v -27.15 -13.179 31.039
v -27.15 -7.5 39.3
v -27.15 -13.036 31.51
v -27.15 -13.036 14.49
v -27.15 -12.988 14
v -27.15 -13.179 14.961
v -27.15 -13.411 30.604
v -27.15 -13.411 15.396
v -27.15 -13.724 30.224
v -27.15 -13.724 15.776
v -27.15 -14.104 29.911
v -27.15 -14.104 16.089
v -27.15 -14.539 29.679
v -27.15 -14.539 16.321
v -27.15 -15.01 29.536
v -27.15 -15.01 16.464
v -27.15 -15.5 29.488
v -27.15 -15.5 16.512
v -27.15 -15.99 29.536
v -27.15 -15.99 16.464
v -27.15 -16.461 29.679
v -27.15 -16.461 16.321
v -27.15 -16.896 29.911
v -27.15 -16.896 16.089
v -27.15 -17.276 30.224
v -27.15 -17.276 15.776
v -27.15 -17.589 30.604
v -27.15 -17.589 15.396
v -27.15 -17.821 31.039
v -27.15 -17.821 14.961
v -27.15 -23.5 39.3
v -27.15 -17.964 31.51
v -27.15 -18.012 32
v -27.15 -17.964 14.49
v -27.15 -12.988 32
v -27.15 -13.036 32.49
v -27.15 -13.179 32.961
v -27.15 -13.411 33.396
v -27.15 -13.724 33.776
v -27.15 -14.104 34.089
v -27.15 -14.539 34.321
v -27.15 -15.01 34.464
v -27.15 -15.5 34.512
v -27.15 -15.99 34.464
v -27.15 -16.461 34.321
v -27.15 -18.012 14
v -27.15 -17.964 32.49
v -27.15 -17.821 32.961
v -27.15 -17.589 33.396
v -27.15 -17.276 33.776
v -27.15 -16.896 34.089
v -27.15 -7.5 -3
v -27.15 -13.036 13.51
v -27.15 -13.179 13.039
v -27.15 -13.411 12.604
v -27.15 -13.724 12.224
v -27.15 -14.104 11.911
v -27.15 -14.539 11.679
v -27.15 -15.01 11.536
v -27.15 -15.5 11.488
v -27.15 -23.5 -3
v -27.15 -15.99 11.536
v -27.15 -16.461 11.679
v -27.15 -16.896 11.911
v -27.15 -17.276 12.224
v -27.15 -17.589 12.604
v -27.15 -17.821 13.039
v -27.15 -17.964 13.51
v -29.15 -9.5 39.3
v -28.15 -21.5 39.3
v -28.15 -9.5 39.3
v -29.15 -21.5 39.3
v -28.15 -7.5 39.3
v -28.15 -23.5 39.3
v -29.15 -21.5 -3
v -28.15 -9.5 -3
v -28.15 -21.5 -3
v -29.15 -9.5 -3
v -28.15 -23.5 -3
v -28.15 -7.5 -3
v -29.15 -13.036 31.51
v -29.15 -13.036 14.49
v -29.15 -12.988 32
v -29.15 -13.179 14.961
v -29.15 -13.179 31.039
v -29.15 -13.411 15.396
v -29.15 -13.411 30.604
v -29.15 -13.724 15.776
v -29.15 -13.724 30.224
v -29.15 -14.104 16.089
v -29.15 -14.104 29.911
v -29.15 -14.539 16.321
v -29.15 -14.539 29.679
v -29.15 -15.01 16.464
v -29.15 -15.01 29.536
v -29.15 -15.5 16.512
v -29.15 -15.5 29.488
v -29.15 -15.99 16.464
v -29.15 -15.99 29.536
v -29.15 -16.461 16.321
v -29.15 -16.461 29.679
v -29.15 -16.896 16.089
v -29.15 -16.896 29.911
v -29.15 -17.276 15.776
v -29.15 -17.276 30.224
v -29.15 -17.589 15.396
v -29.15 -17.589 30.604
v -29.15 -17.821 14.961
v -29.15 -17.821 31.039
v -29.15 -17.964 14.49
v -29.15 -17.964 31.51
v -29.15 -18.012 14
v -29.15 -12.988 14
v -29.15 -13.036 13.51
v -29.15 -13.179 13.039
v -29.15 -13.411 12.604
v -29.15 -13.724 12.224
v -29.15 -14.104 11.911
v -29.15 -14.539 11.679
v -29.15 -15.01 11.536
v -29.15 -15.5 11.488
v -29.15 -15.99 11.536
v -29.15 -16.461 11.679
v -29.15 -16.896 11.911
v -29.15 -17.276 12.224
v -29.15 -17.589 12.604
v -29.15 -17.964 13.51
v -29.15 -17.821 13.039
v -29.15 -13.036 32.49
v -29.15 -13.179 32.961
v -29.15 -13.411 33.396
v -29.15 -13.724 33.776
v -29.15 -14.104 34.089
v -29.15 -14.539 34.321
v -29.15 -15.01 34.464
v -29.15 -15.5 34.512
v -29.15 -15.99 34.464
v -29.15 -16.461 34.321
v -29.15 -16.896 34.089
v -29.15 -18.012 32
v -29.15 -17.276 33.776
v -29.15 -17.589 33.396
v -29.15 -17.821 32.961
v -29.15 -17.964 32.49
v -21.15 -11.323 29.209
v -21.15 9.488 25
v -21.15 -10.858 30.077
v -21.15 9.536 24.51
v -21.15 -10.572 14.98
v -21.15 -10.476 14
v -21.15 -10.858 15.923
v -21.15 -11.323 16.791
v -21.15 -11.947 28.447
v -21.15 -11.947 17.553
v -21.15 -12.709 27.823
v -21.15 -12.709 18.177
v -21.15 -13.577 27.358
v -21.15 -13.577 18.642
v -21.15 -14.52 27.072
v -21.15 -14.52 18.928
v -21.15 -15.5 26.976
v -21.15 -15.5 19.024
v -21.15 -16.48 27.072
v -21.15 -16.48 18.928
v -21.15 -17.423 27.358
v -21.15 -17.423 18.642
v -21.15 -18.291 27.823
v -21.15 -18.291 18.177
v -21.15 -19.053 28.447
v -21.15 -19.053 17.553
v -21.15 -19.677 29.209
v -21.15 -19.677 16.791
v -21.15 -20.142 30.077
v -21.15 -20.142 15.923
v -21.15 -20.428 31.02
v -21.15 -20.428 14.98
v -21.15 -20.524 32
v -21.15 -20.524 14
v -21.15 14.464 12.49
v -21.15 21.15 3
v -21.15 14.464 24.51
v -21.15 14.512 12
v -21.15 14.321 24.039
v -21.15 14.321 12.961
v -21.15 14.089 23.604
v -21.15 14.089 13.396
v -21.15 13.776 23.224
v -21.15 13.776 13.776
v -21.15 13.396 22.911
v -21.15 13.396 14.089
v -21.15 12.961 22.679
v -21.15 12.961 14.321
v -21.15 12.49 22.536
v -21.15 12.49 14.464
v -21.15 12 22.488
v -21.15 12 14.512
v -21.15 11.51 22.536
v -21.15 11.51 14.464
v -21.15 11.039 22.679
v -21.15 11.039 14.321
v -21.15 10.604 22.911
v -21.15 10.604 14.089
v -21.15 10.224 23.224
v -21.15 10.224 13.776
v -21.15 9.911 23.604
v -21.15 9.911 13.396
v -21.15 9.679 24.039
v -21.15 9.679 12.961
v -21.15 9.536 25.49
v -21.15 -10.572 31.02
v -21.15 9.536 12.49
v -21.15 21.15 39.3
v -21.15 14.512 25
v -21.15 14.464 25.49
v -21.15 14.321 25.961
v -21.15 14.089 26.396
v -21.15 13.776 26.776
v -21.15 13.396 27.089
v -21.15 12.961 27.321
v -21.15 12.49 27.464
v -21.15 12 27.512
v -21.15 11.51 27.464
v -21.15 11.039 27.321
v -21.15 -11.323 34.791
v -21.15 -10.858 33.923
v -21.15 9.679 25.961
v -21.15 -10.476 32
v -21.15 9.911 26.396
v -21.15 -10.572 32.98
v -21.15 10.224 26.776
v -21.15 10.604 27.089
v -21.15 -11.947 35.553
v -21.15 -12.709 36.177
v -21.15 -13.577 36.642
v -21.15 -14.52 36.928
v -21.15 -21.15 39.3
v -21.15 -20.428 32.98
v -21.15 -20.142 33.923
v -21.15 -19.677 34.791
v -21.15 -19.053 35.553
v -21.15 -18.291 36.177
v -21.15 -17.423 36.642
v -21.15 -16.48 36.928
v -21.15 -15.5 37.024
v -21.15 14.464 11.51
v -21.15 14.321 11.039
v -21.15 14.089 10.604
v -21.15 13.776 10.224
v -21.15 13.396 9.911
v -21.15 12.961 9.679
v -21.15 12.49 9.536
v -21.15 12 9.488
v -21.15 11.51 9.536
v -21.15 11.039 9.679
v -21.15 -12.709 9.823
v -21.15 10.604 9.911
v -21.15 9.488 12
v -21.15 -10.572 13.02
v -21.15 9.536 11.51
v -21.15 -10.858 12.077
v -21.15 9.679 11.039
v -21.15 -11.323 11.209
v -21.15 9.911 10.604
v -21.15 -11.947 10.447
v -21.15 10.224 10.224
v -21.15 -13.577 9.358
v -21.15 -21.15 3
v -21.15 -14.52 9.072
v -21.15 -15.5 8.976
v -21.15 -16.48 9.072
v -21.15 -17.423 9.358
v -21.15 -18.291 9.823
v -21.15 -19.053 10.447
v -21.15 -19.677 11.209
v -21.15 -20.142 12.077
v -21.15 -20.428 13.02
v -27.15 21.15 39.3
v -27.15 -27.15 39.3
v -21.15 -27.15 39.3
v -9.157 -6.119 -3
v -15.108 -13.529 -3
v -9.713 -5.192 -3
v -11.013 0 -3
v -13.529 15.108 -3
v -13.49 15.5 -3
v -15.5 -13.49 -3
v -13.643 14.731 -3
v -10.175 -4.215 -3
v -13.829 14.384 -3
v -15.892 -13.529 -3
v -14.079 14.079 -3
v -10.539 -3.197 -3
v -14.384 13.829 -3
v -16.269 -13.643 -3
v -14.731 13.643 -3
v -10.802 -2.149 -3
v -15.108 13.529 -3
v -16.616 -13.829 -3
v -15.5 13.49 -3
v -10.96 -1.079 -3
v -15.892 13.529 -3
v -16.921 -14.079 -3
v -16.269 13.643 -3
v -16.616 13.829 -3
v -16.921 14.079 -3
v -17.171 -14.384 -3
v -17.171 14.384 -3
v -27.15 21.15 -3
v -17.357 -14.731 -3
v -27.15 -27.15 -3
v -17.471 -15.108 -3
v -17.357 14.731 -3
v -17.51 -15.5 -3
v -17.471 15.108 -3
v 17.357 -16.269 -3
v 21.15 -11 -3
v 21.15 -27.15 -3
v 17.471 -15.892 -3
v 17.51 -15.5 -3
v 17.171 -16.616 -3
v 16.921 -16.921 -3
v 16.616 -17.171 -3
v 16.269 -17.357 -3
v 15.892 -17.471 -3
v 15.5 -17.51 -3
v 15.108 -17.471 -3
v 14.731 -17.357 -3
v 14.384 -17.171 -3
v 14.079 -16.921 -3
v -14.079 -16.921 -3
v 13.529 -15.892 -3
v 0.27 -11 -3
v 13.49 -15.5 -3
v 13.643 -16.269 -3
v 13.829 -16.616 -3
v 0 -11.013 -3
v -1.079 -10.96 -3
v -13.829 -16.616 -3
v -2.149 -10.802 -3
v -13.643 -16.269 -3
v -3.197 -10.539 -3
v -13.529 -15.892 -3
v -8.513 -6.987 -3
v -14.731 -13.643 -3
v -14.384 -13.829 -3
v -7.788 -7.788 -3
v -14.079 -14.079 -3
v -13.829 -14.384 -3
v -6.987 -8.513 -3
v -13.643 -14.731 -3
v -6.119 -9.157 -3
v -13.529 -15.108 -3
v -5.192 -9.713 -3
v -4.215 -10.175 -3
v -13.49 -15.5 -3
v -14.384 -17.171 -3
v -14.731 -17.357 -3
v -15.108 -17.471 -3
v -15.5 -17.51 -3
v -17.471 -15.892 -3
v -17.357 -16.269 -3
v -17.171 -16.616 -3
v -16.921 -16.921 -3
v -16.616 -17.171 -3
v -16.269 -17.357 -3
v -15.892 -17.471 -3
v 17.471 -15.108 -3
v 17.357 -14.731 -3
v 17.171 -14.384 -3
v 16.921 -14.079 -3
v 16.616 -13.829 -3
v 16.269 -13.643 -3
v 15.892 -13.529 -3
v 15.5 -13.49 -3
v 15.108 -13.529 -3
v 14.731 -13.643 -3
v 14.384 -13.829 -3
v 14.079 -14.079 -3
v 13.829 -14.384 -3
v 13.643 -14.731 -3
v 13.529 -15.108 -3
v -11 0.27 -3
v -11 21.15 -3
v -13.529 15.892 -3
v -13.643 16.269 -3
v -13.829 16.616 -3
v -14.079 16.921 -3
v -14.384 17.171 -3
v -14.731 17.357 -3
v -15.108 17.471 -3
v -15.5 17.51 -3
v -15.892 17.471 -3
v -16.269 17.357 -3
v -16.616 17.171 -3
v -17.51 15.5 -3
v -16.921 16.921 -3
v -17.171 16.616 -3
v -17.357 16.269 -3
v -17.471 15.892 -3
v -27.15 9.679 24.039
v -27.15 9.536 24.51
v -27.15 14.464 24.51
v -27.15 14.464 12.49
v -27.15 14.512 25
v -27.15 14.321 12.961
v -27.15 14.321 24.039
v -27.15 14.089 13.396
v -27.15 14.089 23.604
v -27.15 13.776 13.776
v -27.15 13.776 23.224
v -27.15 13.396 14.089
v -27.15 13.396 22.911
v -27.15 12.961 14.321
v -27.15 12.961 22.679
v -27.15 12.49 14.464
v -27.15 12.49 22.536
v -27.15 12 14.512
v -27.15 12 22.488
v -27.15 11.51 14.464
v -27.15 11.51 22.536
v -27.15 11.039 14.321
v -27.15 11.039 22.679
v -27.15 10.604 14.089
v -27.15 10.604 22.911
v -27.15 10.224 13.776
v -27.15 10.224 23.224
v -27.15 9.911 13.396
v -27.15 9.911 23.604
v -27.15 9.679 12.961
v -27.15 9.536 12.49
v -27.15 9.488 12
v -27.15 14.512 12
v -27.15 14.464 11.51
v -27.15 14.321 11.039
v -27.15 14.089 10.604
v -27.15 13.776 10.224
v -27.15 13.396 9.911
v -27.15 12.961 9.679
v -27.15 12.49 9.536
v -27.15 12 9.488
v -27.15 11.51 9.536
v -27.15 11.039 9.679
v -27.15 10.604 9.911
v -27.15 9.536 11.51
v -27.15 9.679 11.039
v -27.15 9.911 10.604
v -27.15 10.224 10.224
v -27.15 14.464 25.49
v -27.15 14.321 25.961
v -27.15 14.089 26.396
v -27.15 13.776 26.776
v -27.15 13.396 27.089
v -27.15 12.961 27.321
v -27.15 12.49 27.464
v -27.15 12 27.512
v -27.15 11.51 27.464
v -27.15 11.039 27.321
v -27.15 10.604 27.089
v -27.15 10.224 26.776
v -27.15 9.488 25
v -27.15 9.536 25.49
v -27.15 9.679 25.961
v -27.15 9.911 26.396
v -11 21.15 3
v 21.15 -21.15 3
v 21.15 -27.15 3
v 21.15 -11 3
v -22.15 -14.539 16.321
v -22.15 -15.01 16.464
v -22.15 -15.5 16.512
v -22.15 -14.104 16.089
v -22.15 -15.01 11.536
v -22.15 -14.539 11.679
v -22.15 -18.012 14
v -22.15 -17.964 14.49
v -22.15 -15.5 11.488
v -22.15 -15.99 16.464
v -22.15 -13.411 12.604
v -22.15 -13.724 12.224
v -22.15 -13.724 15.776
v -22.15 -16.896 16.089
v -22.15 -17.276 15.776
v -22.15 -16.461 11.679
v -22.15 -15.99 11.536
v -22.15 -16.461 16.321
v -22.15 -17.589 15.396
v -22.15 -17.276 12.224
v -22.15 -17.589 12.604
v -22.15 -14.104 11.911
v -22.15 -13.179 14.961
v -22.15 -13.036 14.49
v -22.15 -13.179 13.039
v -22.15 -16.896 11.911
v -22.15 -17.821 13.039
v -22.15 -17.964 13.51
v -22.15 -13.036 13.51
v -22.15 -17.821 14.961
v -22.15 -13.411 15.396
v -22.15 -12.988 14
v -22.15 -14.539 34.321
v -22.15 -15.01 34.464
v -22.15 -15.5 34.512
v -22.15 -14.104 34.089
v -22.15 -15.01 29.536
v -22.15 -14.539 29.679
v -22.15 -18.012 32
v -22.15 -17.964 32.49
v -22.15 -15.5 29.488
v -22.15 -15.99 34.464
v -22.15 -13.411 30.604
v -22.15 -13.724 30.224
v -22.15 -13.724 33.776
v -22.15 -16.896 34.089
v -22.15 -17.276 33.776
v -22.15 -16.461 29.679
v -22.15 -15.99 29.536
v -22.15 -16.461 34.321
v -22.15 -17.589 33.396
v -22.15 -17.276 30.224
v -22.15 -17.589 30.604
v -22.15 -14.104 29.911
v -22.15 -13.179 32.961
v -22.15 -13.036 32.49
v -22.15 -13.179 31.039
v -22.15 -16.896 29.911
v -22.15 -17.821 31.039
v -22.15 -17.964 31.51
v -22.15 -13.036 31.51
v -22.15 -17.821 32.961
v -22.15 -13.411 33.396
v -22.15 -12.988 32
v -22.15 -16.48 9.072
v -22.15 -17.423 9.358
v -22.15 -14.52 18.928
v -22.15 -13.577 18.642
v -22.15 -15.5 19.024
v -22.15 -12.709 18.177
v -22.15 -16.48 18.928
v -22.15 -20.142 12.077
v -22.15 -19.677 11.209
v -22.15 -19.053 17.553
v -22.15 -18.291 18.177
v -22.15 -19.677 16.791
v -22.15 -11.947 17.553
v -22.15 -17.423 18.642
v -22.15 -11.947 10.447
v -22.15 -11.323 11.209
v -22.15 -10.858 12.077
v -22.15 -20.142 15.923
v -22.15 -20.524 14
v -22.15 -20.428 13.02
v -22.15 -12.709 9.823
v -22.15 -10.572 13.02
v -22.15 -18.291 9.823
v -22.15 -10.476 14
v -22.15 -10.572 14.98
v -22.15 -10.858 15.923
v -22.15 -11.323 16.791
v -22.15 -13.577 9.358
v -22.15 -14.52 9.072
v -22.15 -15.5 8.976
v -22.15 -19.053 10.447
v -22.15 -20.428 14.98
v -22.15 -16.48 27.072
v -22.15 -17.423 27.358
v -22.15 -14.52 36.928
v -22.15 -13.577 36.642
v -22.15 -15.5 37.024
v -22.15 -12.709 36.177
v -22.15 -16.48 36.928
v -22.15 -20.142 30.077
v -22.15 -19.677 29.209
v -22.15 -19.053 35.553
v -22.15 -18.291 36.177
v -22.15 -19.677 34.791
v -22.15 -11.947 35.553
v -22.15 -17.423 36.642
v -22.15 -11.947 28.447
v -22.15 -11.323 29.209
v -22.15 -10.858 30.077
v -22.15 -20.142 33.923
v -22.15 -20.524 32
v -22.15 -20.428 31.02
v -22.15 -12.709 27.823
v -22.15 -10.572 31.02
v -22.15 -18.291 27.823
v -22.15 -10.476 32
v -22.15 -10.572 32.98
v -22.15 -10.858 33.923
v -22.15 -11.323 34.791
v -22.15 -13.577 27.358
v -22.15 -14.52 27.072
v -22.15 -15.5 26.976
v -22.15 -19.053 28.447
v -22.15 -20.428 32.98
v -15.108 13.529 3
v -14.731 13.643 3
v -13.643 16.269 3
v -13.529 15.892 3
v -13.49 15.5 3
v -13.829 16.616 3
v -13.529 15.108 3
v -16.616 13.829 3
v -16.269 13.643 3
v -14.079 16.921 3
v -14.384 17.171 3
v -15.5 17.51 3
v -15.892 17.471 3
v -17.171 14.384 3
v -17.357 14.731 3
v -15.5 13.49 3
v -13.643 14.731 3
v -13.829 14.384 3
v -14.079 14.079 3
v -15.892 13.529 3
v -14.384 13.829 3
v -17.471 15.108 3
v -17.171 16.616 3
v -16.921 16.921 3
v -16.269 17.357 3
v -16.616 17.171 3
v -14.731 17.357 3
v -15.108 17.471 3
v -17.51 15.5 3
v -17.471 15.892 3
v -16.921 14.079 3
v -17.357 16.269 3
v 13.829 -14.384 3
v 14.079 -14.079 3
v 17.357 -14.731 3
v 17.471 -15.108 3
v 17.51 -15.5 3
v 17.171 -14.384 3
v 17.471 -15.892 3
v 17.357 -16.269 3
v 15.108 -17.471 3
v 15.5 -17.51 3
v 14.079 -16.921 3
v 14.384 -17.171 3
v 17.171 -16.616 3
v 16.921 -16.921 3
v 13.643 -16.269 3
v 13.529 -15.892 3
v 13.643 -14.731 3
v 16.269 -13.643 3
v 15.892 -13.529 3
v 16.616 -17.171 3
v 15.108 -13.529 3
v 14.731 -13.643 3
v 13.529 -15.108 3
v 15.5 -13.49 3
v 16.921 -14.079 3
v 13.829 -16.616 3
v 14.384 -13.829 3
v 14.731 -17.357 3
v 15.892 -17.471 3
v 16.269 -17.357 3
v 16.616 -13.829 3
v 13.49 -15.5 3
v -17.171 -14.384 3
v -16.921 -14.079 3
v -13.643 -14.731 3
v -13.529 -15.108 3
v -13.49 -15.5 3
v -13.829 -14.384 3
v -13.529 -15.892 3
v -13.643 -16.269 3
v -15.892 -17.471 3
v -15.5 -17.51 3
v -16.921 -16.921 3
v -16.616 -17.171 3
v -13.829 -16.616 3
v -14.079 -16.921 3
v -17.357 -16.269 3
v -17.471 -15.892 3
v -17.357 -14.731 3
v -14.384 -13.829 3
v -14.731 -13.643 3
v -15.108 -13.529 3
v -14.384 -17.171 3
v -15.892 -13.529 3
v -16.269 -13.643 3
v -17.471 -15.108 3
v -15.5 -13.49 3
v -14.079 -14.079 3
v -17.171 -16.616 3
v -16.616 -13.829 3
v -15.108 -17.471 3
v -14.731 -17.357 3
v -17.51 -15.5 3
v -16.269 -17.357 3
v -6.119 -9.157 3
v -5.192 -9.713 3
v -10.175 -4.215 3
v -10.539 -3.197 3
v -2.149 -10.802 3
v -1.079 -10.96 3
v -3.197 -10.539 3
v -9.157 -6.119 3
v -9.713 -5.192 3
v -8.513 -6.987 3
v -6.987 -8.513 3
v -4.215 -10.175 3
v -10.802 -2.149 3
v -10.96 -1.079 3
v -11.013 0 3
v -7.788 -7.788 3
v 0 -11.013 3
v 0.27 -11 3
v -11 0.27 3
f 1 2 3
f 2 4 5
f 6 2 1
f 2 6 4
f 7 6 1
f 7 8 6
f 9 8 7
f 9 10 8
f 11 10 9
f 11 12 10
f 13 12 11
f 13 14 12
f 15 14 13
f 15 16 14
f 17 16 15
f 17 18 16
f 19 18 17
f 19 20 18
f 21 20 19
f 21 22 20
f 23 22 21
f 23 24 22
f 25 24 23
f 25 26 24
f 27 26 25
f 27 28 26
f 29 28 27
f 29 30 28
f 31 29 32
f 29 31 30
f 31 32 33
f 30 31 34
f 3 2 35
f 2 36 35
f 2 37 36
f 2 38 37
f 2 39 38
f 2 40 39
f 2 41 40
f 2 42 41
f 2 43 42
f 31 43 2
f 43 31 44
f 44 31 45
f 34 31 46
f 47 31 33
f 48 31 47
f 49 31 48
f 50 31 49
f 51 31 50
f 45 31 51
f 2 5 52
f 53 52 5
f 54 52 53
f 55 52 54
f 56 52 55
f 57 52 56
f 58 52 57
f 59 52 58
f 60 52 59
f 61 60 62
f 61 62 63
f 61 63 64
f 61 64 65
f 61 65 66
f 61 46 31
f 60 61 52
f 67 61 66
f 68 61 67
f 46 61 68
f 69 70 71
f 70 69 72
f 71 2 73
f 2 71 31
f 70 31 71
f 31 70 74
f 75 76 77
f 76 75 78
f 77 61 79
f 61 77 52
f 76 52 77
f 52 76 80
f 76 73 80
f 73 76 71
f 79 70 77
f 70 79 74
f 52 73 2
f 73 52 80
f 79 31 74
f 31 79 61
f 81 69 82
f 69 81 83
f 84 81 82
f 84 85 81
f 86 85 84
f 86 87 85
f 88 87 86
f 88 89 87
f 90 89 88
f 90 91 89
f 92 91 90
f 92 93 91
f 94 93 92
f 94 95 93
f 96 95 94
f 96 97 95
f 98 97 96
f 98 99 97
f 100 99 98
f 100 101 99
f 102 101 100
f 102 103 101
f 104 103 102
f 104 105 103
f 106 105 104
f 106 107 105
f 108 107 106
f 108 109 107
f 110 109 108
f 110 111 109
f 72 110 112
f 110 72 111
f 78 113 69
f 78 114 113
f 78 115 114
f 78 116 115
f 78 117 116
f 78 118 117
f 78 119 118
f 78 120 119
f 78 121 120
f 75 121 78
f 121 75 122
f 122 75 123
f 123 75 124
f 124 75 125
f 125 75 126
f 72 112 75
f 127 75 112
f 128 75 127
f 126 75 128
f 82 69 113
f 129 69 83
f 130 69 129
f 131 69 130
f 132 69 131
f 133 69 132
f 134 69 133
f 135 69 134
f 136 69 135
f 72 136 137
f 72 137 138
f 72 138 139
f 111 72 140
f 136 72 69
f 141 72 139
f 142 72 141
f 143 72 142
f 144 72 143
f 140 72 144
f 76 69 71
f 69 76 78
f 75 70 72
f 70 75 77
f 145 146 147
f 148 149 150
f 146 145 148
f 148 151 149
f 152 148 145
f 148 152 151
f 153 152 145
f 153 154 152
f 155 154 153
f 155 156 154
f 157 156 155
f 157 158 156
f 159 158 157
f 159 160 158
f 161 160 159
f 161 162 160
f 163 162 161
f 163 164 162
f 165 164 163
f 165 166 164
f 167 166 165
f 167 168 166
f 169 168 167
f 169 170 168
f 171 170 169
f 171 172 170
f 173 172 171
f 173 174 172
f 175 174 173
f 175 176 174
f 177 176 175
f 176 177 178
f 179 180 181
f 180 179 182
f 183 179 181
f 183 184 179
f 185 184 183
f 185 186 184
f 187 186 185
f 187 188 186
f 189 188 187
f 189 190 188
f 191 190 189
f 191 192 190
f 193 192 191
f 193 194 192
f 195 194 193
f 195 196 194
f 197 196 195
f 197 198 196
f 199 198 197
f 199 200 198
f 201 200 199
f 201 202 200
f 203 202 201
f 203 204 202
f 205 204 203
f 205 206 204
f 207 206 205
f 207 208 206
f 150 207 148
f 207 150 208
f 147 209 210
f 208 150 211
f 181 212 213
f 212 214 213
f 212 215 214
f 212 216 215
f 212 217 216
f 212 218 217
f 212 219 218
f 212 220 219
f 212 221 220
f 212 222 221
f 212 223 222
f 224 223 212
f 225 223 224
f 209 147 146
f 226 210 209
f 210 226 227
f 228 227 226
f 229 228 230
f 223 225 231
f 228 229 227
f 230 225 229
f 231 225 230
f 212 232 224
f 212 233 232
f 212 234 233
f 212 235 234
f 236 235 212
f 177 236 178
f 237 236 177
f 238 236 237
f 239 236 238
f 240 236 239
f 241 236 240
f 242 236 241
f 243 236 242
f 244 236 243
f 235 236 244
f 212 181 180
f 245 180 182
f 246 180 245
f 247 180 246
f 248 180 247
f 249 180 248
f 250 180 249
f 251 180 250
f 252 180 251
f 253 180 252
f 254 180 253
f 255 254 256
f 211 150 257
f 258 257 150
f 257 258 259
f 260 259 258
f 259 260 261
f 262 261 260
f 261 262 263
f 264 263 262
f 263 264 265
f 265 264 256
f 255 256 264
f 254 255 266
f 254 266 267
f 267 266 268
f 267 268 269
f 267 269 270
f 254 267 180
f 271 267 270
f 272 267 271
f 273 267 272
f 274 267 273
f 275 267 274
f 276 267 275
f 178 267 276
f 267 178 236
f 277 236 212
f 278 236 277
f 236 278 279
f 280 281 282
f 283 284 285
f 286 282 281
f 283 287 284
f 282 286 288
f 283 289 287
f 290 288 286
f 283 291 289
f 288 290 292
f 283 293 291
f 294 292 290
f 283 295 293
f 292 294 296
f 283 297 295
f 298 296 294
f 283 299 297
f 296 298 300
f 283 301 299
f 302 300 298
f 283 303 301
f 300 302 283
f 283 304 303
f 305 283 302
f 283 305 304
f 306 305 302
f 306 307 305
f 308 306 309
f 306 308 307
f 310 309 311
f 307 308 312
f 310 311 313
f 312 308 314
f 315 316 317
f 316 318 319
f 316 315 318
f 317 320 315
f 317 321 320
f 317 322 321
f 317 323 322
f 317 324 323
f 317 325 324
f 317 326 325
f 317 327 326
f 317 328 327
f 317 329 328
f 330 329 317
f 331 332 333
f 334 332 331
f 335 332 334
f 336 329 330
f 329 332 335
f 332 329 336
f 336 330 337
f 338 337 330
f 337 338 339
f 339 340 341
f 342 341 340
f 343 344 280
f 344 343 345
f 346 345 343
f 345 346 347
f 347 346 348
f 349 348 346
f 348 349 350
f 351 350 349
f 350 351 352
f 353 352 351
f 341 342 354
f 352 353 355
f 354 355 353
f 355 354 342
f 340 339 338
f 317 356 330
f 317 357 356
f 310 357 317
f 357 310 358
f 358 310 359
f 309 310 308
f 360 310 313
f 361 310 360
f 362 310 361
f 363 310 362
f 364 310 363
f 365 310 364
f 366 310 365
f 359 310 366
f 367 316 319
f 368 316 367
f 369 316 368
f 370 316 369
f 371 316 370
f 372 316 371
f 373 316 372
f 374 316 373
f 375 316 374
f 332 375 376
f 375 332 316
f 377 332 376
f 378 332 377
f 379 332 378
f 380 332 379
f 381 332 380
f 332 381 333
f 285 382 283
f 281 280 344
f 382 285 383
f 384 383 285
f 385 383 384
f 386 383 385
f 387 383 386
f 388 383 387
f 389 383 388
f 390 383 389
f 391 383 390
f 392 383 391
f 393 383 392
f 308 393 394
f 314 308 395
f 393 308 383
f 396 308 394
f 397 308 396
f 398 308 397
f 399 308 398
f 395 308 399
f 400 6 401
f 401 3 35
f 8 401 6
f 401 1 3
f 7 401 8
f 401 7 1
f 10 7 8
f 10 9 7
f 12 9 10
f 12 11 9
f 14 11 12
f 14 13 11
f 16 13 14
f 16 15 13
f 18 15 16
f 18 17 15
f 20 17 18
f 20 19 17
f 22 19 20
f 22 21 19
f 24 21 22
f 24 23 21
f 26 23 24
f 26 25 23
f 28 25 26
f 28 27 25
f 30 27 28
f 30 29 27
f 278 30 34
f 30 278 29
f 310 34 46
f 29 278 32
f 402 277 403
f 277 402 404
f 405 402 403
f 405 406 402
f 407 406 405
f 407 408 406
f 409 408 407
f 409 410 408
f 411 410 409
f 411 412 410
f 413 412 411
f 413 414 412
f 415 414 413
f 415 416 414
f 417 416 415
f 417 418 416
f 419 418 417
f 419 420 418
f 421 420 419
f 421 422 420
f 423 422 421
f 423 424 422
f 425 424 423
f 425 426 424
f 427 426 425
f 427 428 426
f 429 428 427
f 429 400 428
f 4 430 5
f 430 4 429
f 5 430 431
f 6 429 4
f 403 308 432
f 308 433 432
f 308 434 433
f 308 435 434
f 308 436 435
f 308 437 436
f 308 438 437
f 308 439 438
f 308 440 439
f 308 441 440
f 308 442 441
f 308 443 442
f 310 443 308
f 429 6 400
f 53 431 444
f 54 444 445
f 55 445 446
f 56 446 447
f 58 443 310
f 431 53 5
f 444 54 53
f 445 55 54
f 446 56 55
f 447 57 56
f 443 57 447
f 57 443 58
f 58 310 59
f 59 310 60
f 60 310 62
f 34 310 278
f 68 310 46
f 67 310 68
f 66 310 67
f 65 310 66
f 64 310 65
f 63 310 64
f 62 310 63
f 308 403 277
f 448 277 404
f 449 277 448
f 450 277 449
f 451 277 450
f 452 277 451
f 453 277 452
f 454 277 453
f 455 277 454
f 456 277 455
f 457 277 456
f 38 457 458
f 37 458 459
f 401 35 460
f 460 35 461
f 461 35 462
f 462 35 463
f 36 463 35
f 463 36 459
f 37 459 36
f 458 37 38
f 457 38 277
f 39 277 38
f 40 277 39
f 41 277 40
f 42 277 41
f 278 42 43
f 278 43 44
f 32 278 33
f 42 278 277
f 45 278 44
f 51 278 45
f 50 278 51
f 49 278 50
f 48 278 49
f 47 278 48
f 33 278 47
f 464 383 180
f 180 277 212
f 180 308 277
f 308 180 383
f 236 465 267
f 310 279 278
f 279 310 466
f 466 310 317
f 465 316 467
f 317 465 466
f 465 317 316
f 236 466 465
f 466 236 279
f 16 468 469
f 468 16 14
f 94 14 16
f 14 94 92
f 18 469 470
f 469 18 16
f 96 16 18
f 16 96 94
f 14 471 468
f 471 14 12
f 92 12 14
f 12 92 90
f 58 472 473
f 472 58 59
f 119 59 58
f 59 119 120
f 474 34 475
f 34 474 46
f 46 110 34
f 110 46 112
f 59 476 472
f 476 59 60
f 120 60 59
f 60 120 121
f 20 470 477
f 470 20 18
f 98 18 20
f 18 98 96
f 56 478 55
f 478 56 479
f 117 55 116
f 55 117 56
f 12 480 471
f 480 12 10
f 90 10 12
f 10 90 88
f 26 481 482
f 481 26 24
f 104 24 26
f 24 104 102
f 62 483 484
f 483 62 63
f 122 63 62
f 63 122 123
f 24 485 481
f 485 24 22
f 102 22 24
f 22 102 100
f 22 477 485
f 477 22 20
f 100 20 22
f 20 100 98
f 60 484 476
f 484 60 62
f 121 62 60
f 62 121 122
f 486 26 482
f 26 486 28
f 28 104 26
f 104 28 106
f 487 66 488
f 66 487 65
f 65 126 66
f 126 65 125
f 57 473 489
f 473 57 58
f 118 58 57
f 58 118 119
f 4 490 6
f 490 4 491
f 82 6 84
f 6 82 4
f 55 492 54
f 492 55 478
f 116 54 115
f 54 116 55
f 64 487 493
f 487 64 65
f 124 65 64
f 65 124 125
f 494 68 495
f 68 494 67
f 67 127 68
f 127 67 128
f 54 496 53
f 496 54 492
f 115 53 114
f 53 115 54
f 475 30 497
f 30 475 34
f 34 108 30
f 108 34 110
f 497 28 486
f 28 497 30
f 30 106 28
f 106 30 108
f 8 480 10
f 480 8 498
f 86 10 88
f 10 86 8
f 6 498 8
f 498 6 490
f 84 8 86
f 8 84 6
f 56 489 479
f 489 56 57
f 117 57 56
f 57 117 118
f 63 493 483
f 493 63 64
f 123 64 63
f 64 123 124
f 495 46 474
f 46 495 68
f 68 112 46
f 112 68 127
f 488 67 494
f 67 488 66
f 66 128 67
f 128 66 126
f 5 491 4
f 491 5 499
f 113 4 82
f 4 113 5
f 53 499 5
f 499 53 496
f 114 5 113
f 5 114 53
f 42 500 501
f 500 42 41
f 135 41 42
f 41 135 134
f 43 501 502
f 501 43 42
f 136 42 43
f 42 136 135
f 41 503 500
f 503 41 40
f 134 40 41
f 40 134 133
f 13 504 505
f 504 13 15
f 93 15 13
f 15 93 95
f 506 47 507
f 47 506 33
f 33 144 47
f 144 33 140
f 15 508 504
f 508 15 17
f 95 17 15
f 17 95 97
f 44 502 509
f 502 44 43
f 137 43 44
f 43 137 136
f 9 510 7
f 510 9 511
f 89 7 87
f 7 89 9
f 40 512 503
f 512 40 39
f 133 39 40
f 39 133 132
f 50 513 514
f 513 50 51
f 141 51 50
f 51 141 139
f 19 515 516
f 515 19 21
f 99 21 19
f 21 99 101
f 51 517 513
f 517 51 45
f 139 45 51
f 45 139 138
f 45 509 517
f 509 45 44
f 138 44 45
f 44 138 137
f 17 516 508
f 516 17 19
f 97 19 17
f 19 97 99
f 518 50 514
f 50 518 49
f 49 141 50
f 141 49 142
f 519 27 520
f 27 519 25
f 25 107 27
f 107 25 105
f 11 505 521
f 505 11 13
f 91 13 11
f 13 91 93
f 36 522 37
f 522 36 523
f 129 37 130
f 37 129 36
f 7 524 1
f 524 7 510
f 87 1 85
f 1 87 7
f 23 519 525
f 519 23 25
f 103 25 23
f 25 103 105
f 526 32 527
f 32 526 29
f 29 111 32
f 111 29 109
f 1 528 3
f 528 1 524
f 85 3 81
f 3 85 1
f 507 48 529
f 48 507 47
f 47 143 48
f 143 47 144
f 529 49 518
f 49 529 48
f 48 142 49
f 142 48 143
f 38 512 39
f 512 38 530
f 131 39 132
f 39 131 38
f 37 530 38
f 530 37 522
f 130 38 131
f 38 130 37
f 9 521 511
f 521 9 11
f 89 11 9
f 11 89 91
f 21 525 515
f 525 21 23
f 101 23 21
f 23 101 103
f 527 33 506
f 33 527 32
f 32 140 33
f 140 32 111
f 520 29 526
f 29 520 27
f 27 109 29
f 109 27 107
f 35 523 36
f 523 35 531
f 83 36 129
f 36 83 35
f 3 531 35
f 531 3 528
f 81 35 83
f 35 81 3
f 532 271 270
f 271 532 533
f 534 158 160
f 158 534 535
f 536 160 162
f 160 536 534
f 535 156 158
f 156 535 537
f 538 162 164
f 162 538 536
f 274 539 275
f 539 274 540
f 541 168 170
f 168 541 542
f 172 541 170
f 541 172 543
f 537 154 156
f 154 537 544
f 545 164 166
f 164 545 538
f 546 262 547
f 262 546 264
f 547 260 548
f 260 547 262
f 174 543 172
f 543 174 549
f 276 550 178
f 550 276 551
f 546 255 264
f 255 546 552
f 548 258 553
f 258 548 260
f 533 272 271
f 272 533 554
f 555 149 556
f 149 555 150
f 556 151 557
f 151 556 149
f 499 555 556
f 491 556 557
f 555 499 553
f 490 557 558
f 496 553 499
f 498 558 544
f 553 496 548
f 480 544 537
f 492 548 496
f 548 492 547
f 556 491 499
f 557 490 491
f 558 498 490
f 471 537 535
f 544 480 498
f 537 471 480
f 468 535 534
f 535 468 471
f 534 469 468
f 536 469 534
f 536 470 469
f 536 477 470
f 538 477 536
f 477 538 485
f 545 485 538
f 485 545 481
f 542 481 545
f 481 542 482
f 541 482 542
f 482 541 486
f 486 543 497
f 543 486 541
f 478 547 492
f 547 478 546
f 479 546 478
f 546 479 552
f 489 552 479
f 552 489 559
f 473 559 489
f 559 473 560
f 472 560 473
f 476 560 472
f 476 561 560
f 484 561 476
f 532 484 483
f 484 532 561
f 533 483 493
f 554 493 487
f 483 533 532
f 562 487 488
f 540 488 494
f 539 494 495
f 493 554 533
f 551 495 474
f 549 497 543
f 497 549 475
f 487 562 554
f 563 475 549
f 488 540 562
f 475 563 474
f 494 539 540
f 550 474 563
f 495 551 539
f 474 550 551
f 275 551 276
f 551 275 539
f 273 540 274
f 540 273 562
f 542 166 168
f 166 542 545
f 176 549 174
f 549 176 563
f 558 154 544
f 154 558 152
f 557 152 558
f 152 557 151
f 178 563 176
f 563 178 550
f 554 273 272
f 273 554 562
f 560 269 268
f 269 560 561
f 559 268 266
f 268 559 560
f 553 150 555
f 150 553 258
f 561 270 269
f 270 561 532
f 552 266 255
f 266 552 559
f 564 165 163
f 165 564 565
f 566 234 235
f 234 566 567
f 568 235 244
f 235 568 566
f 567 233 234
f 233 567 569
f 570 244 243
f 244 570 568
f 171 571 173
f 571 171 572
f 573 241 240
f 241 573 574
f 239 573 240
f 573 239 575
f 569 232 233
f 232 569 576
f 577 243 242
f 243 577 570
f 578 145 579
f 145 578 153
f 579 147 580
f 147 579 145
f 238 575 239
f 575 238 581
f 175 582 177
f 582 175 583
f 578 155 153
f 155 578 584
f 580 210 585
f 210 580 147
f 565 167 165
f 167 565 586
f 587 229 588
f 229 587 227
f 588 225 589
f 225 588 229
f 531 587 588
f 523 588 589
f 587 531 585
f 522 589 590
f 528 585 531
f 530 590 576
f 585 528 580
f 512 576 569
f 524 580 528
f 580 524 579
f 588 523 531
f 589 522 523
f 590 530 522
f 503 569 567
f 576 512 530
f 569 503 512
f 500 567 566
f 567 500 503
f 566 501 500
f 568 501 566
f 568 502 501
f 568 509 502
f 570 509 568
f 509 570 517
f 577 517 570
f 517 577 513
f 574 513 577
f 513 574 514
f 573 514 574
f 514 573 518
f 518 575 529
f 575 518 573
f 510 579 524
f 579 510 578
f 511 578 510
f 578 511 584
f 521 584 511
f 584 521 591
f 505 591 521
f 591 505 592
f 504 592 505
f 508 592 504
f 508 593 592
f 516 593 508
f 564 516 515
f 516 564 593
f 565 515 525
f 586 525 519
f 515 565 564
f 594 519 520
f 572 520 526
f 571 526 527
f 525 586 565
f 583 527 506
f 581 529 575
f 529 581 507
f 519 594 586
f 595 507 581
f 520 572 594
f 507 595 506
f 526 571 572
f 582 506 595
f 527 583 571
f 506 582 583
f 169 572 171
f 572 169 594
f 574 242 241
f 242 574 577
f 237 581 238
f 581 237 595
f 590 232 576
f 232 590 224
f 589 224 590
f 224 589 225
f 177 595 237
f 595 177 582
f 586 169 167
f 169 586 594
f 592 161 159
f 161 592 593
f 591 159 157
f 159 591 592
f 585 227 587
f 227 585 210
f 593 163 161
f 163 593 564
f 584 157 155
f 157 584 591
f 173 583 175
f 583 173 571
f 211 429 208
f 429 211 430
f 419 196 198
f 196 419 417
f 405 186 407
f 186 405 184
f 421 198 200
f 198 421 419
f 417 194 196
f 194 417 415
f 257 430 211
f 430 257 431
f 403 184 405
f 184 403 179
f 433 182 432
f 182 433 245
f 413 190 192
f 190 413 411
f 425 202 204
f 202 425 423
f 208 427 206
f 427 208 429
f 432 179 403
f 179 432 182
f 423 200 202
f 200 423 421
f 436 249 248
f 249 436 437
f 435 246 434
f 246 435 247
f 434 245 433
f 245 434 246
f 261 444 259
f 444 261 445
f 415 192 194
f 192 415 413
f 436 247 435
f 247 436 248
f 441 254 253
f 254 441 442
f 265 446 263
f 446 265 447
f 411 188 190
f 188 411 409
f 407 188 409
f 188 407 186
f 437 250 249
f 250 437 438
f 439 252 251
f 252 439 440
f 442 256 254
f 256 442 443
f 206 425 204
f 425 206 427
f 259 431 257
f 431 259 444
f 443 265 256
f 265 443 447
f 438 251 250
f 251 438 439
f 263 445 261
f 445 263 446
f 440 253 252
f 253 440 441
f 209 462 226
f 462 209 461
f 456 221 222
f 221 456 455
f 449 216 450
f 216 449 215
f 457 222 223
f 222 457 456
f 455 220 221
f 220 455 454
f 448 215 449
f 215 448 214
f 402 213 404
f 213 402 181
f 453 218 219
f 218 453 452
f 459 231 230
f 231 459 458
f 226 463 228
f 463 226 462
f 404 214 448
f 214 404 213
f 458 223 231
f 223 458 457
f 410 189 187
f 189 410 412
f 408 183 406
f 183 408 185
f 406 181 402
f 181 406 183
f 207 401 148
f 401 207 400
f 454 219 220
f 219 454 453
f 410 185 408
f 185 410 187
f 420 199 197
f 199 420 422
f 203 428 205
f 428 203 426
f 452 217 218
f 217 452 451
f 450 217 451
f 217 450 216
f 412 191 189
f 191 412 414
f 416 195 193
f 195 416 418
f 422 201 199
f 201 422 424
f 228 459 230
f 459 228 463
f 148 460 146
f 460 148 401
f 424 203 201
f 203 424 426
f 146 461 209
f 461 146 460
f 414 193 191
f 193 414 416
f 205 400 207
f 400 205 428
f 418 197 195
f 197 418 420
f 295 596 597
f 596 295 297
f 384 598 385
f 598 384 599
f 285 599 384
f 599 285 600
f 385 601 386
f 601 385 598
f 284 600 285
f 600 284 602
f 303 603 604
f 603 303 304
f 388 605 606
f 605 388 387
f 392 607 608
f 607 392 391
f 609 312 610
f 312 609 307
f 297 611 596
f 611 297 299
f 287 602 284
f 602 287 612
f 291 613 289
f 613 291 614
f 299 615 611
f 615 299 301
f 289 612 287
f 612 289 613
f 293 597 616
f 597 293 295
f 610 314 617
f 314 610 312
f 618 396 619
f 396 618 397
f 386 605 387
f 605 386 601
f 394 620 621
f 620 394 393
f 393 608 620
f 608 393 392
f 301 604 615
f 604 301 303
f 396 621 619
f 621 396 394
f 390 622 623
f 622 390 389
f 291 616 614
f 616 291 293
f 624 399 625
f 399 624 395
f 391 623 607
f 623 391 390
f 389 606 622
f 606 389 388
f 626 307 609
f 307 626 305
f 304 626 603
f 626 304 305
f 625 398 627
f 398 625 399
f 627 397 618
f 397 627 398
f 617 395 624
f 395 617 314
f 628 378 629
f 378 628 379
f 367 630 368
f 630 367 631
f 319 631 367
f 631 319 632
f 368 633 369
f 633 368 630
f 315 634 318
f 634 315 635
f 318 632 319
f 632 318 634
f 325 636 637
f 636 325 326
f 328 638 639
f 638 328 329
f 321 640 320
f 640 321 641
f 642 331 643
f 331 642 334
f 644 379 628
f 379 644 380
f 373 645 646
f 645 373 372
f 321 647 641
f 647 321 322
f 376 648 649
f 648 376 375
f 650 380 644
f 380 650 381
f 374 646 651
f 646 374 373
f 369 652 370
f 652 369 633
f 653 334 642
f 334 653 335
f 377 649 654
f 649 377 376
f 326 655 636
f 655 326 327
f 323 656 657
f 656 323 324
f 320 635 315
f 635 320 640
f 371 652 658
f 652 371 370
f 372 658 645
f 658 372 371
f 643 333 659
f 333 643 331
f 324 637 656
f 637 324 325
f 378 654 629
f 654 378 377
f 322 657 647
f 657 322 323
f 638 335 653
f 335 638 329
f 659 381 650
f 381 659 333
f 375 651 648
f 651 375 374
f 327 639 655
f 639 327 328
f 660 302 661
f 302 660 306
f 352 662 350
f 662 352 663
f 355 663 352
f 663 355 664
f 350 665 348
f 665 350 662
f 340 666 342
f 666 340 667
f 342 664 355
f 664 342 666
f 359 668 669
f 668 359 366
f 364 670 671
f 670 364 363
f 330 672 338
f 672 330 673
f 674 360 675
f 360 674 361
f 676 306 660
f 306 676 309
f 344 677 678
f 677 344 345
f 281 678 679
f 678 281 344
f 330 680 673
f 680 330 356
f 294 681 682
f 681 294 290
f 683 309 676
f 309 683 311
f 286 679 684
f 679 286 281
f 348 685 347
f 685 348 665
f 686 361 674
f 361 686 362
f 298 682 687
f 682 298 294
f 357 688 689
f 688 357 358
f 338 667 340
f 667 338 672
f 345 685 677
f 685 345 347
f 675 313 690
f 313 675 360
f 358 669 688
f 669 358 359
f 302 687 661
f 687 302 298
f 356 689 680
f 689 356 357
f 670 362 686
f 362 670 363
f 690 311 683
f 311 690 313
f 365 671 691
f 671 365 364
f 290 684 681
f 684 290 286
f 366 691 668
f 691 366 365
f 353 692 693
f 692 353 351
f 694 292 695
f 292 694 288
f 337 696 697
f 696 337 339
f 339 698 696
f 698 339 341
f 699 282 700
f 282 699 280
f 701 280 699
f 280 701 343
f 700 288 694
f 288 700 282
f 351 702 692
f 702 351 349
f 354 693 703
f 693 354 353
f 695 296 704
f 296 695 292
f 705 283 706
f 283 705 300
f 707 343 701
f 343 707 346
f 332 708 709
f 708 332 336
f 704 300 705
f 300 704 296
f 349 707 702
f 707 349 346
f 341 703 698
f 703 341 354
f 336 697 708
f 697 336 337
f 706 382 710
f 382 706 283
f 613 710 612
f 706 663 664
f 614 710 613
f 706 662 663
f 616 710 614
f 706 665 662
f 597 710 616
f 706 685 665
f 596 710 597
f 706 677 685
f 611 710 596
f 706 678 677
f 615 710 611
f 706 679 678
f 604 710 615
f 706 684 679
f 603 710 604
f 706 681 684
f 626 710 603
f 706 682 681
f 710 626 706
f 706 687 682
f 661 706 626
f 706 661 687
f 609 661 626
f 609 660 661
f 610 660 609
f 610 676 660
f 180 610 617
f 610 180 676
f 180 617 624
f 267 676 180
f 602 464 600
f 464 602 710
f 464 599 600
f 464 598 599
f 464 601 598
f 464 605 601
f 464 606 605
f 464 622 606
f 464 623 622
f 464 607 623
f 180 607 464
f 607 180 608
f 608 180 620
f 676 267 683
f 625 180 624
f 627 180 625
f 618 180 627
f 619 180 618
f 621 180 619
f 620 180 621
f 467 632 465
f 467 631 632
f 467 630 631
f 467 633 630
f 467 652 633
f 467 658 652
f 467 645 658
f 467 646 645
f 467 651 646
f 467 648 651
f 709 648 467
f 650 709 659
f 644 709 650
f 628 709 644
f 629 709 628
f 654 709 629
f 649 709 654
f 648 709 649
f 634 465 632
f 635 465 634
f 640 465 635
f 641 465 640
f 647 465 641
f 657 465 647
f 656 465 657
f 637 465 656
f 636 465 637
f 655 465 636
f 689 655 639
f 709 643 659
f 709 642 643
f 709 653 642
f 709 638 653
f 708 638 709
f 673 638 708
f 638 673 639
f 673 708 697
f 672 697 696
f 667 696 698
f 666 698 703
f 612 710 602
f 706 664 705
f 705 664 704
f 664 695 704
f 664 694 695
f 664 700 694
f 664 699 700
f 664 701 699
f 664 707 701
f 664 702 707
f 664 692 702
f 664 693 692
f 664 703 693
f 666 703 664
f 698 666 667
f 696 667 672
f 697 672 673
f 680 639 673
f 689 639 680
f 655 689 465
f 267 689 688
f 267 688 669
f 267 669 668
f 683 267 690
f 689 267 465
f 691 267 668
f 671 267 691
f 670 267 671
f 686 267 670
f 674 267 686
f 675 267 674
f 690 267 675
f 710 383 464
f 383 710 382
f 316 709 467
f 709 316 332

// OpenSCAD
// file: includes/config.scad
$fn=32;

nema_size_x = 42.3;
nema_size_y = 42.3;
nema_screw = 4;
nema_screw_cap = 8;
nema_hole_spacing = 31;
nema_center_hole = 22;

x = 27.35; //bolt hole spacing
y = 45;

X_rod_diameter = 10;
Y_rod_diameter = 8;
Z_rod_diameter = 10; //smooth rod

Z_bearing_dia = 15;
Z_bearing_h = 25;

block_bolt_size = 4;
block_bolt_head = 9;
z_nut = 13;
z_rod = 8; //threaded rod
z_motor_bolt = 5.5;
d_spacer=12;
d_bolt=5;
clearance = 0.25;
// file: includes/adjustments.scad
//these two are needed otherwise you need to put them in
//if you forget it'll complain about unknown variables.
$fn=32;
center=false;

module nut()
{
cylinder(d=(2*(tan(30)*nut_size)),h=nut_h, center=center, $fn=6); // don't do anything here
    //echo ("point to point:"); // this just echoes
    //echo ((tan(30)*nut_size)*2); //the diameter of a circle that will encompass the exterior of the hexagonal shape.
}

module hole()
{ 

    //hole = size of the hole
    //h = height
    cylinder(d=(hole_dia+(hole_dia-(cos(360 / (2*$fn)) * hole_dia) )),h=h,center=center,$fn=$fn); 
    //echo ("real hole diameter");
    //echo ((hole_dia+(hole_dia-(cos(360 / (2*$fn)) * hole_dia) )));
}
// main file
/*
Notes:

2 holes up the top (as mounted) are for LED's, either some kind of status indicator
or perhaps just illumination. Intended for indicating when the hot end and bed heaters are on.


*/

$fn=32;
include <includes/adjustments.scad>
include <includes/config.scad>

frame_screw = 5;
frame_screw_cap = 10;
thickness = 6;

//27 square

module nema_holes(){
    union(){
        translate([-nema_hole_spacing/2,nema_hole_spacing/2])hole(hole_dia=nema_screw,h=thickness+1,center=true);
        translate([nema_hole_spacing/2,nema_hole_spacing/2])hole(hole_dia=nema_screw,h=thickness+1,center=true);
        translate([nema_hole_spacing/2,-nema_hole_spacing/2])hole(hole_dia=nema_screw,h=thickness+1,center=true);
        translate([-nema_hole_spacing/2,-nema_hole_spacing/2])hole(hole_dia=nema_screw,h=thickness+1,center=true);
        hole(hole_dia=nema_center_hole,h=thickness+1,center=true,$fn=64);
    }
}

module rail_steady(){
    translate([0,0,0])cube([1,16,nema_size_x],center=true);
    translate([-1,0,0])cube([1,12,nema_size_x],center=true); 
    
}

module motor_plate(){
    difference(){
        cube([nema_size_y,nema_size_x,thickness],center=true);
        nema_holes();
        translate([(nema_size_x/2)-(nema_center_hole/2),nema_size_x/2])cube([nema_size_x,nema_size_y,thickness+1],center=true);
        translate([nema_size_x/2,(nema_size_y/2)-(nema_center_hole/2)])cube([nema_size_x,nema_size_y,thickness+1],center=true);
    }
}
module frame_mount(){
    difference(){
        union(){
            translate([-(nema_size_x/2)-(thickness+0.5),-(nema_hole_spacing/2),nema_size_x/2-(thickness/2)])rail_steady();
            translate([-(nema_size_x/2)-(thickness/2),0,(nema_size_x/2)-(thickness/2)])cube([thickness,nema_size_y,nema_size_x],center=true);
            hull(){
                translate([(nema_size_x/2)-(thickness/2),-(nema_size_y/2)-(thickness/2),0])cube([thickness,thickness,thickness],center=true);
                translate([-(nema_size_x/2)-(thickness/2),-(nema_size_y/2)-(thickness/2),(nema_size_x/2)-(thickness/2)])cube([thickness,thickness,nema_size_x],center=true);
            }
        }
        union(){
            translate([-(nema_size_x/2)-(thickness/2),0,14])
            rotate([0,-90]){
                translate([0,-nema_hole_spacing/2])hole(hole_dia=frame_screw,h=thickness+10,center=true);
                translate([18,-nema_hole_spacing/2])hole(hole_dia=frame_screw,h=thickness+10,center=true);
                translate([0,-nema_hole_spacing/2,-10])hole(hole_dia=frame_screw_cap,h=thickness+10,center=true);
                translate([18,-nema_hole_spacing/2,-10])hole(hole_dia=frame_screw_cap,h=thickness+10,center=true);
                
            }
            translate([-(nema_size_x/2)+0.5,12,12])rotate([0,-90])hole(hole_dia=5,h=thickness+10,center=true);
            translate([-(nema_size_x/2)+0.5,12,25])rotate([0,-90])hole(hole_dia=5,h=thickness+10,center=true);
        }
    }
}

union(){
    frame_mount();
    motor_plate();
}
